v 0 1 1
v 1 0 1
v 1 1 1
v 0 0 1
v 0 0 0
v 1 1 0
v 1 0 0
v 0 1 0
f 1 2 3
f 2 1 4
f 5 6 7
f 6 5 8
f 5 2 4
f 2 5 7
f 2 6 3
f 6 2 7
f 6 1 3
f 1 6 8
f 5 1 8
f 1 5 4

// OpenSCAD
// Unsaved Native Agent acceptance buffer
label="abcdef"; // 3
cube(1);
